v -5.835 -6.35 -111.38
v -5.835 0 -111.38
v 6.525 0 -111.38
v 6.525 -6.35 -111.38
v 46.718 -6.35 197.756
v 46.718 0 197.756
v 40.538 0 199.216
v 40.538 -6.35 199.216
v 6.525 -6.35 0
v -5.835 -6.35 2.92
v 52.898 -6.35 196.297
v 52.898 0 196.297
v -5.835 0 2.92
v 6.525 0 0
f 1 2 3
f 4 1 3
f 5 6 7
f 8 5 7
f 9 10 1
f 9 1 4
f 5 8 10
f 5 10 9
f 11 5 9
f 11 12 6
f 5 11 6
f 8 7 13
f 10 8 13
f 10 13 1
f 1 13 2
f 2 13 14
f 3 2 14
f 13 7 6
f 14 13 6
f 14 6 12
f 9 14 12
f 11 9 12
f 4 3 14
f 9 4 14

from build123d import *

# Parameters (mm, degrees)
F1_DEPTH = 6.35


with BuildPart() as f1:
    # F0 (on Front) → F1 (new body)
    with BuildSketch(Plane.XZ):
        Polygon((52.898277, 196.296548), (46.718386, 197.756498), (40.538496, 199.216447), (-5.834989, 2.919899), (-5.834989, 1.378469), (0, 0), (6.524792, -1.54143), (6.524792, 0), align=None)
        Polygon((0, 0), (-5.834989, 1.378469), (-5.834989, -111.380101), (6.524792, -111.380101), (6.524792, -1.54143), align=None)
    extrude(amount=F1_DEPTH)


solid = f1.part
